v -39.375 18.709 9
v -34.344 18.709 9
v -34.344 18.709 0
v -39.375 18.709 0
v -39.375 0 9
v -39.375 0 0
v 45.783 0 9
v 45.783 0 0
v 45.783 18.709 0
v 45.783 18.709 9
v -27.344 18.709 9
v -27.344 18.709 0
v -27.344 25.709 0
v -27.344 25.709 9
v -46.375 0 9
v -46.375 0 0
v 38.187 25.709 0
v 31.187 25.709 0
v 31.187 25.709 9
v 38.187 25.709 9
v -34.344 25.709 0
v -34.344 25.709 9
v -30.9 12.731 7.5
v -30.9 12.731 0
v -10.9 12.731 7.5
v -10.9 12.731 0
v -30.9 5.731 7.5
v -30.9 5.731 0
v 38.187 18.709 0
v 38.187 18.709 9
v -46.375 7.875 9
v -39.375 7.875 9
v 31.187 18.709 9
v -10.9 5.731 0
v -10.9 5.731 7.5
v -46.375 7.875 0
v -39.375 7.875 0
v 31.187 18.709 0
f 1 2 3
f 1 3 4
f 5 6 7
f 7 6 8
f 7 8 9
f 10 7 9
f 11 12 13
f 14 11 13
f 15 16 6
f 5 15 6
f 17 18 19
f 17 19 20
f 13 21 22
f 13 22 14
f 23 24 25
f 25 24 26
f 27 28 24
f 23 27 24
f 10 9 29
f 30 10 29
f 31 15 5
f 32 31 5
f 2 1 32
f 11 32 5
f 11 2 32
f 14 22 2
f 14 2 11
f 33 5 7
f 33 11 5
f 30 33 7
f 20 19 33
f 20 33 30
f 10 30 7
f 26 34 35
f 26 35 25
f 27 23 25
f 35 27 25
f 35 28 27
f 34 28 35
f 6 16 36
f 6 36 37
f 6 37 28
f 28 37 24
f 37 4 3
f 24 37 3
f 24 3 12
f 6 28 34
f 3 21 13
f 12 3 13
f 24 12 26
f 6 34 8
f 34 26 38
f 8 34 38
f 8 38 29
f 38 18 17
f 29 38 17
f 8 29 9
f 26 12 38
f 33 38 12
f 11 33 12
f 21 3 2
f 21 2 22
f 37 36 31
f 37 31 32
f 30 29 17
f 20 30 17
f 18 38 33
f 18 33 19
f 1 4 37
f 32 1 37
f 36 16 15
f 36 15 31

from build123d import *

# Parameters (mm, degrees)
F0_W     = 20
F0_H     = 7
F0_W_2   = 7
F0_H_2   = 7.875001
F1_DEPTH = 9
F2_DEPTH = 7.5


with BuildPart() as f1:
    # F0 (on Top) → F1 (new body)
    with BuildSketch(Plane.XY):
        Polygon((-39.375005, 7.875001), (-39.375005, 0), (45.783415, 0), (45.783415, 18.708905), (38.187098, 18.708905), (31.187098, 18.708905), (-27.343754, 18.708905), (-34.343754, 18.708905), (-39.375005, 18.708905), align=None)
        with Locations((-20.899706, 9.230794)):
            Rectangle(F0_W, F0_H, mode=Mode.SUBTRACT)
        with Locations((-42.875005, 3.9375)):
            Rectangle(F0_W_2, F0_H_2)
        with Locations((34.687098, 22.208905)):
            Rectangle(F0_W_2, F0_H)
        with Locations((-30.843754, 22.208905)):
            Rectangle(F0_W_2, F0_H)
        with Locations((-20.899706, 9.230794)):
            Rectangle(F0_W, F0_H)
    extrude(amount=F1_DEPTH)

    # F0 (on Top) → F2 (cut)
    with BuildSketch(Plane.XY):
        with Locations((-20.899706, 9.230794)):
            Rectangle(F0_W, F0_H)
    extrude(amount=F2_DEPTH, mode=Mode.SUBTRACT)


solid = f1.part
